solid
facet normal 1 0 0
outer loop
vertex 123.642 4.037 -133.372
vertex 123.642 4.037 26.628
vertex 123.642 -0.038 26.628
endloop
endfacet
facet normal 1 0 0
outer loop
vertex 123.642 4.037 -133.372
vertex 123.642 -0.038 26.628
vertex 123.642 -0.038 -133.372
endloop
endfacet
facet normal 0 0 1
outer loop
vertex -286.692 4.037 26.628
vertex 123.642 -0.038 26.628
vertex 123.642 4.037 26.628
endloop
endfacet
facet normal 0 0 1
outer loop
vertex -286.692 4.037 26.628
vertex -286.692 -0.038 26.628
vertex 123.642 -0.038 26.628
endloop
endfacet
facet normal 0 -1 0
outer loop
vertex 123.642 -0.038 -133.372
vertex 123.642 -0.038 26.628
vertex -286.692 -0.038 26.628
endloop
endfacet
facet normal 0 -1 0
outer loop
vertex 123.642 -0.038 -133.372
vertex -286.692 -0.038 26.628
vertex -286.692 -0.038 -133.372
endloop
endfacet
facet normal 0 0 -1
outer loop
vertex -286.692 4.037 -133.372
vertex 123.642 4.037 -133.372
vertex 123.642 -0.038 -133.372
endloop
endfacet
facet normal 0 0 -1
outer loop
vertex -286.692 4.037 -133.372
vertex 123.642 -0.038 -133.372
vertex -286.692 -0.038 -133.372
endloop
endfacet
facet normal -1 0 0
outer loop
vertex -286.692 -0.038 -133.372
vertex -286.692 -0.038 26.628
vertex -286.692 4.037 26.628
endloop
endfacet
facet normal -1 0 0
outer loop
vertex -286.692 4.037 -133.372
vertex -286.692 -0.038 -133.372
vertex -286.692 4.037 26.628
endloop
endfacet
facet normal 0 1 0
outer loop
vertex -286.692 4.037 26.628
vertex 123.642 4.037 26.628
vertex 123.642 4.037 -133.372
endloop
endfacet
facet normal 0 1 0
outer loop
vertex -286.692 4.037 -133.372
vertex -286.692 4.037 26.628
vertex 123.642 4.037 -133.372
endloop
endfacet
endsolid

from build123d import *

# Parameters (mm, degrees)
SKETCH1_W           = 405.33723822
SKETCH1_H           = 160
BOSS_EXTRUDE1_DEPTH = 4
SKETCH2_W           = 3.5
SKETCH2_H           = 4
CUT_EXTRUDE2_DEPTH  = 184
SKETCH3_W           = 2
SKETCH3_H           = 4
CUT_EXTRUDE3_DEPTH  = 184
SCALE1_SCALE        = 1.01875
SKETCH4_W           = 5
SKETCH4_H           = 4.075
CUT_EXTRUDE4_DEPTH  = 220
SKETCH5_W           = 0.5
SKETCH5_H           = 4.075
CUT_EXTRUDE5_DEPTH  = 430
SKETCH6_W           = 1
SKETCH6_H           = 4.075
CUT_EXTRUDE6_DEPTH  = 430
SKETCH7_W           = 0.5
SKETCH7_H           = 4.075
CUT_EXTRUDE7_DEPTH  = 430
SKETCH8_W           = 1
SKETCH8_H           = 4.075
CUT_EXTRUDE8_DEPTH  = 430
SKETCH9_W           = 160
SKETCH9_H           = 4.075
BOSS_EXTRUDE2_DEPTH = 6
SKETCH11_W          = 408.334186436
SKETCH11_H          = 4.075
BOSS_EXTRUDE4_DEPTH = 3
SKETCH12_W          = 163
SKETCH12_H          = 4.075
BOSS_EXTRUDE5_DEPTH = 2
SKETCH13_W          = 410.334186436
SKETCH13_H          = 4.075
CUT_EXTRUDE9_DEPTH  = 3


with BuildPart() as part:
    # Sketch1 → Boss-Extrude1 (new body)
    with BuildSketch(Plane(origin=(0, 0, 0), x_dir=(1, 0, 0), z_dir=(0, 1, 0))):
        with Locations((-74.274989913, 53.371553885)):
            Rectangle(SKETCH1_W, SKETCH1_H)
    extrude(amount=BOSS_EXTRUDE1_DEPTH)

    # Sketch2 → Cut-Extrude2 (cut)
    with BuildSketch(Plane.XY.offset(26.628446115)):
        with Locations((126.643629197, 2)):
            Rectangle(SKETCH2_W, SKETCH2_H)
    extrude(amount=-CUT_EXTRUDE2_DEPTH, mode=Mode.SUBTRACT)

    # Sketch3 → Cut-Extrude3 (cut)
    with BuildSketch(Plane.XY.offset(26.628446115)):
        with Locations((123.893629197, 2)):
            Rectangle(SKETCH3_W, SKETCH3_H)
    extrude(amount=-CUT_EXTRUDE3_DEPTH, mode=Mode.SUBTRACT)


with BuildPart() as part_1:
    # Scale1: scaled about (-77.024989913, 2, -53.371553885)
    add(part.part.scale(SCALE1_SCALE).moved(Location((1.444218561, -0.0375, 1.000716635))))

    # Sketch4 → Cut-Extrude4 (cut)
    with BuildSketch(Plane.XY.offset(28.128446115)):
        with Locations((124.142103305, 2)):
            Rectangle(SKETCH4_W, SKETCH4_H)
    extrude(amount=-CUT_EXTRUDE4_DEPTH, mode=Mode.SUBTRACT)

    # Sketch5 → Cut-Extrude5 (cut)
    with BuildSketch(Plane.ZY.offset(280.692083131)):
        with Locations((-134.621553885, 2)):
            Rectangle(SKETCH5_W, SKETCH5_H)
    extrude(amount=-CUT_EXTRUDE5_DEPTH, mode=Mode.SUBTRACT)

    # Sketch6 → Cut-Extrude6 (cut)
    with BuildSketch(Plane.ZY.offset(280.692083131)):
        with Locations((27.628446115, 2)):
            Rectangle(SKETCH6_W, SKETCH6_H)
    extrude(amount=-CUT_EXTRUDE6_DEPTH, mode=Mode.SUBTRACT)

    # Sketch7 → Cut-Extrude7 (cut)
    with BuildSketch(Plane.ZY.offset(280.692083131)):
        with Locations((26.878446115, 2)):
            Rectangle(SKETCH7_W, SKETCH7_H)
    extrude(amount=-CUT_EXTRUDE7_DEPTH, mode=Mode.SUBTRACT)

    # Sketch8 → Cut-Extrude8 (cut)
    with BuildSketch(Plane.ZY.offset(280.692083131)):
        with Locations((-133.871553885, 2)):
            Rectangle(SKETCH8_W, SKETCH8_H)
    extrude(amount=-CUT_EXTRUDE8_DEPTH, mode=Mode.SUBTRACT)

    # Sketch9 → Boss-Extrude2 (add)
    with BuildSketch(Plane.ZY.offset(280.692083131)):
        with Locations((-53.371553885, 2)):
            Rectangle(SKETCH9_W, SKETCH9_H)
    extrude(amount=BOSS_EXTRUDE2_DEPTH)

    # Sketch11 → Boss-Extrude4 (add)
    with BuildSketch(Plane(origin=(0, 0, -133.371553885), x_dir=(-1, 0, 0), z_dir=(0, 0, -1))):
        with Locations((82.524989913, 2)):
            Rectangle(SKETCH11_W, SKETCH11_H)
    extrude(amount=BOSS_EXTRUDE4_DEPTH)

    # Sketch12 → Boss-Extrude5 (add)
    with BuildSketch(Plane(origin=(121.642103305, 0, 0), x_dir=(0, 0, -1), z_dir=(1, 0, 0))):
        with Locations((54.871553885, 2)):
            Rectangle(SKETCH12_W, SKETCH12_H)
    extrude(amount=BOSS_EXTRUDE5_DEPTH)

    # Sketch13 → Cut-Extrude9 (cut)
    with BuildSketch(Plane(origin=(0, 0, -136.371553885), x_dir=(-1, 0, 0), z_dir=(0, 0, -1))):
        with Locations((81.524989913, 2)):
            Rectangle(SKETCH13_W, SKETCH13_H)
    extrude(amount=-CUT_EXTRUDE9_DEPTH, mode=Mode.SUBTRACT)


solid = part_1.part
